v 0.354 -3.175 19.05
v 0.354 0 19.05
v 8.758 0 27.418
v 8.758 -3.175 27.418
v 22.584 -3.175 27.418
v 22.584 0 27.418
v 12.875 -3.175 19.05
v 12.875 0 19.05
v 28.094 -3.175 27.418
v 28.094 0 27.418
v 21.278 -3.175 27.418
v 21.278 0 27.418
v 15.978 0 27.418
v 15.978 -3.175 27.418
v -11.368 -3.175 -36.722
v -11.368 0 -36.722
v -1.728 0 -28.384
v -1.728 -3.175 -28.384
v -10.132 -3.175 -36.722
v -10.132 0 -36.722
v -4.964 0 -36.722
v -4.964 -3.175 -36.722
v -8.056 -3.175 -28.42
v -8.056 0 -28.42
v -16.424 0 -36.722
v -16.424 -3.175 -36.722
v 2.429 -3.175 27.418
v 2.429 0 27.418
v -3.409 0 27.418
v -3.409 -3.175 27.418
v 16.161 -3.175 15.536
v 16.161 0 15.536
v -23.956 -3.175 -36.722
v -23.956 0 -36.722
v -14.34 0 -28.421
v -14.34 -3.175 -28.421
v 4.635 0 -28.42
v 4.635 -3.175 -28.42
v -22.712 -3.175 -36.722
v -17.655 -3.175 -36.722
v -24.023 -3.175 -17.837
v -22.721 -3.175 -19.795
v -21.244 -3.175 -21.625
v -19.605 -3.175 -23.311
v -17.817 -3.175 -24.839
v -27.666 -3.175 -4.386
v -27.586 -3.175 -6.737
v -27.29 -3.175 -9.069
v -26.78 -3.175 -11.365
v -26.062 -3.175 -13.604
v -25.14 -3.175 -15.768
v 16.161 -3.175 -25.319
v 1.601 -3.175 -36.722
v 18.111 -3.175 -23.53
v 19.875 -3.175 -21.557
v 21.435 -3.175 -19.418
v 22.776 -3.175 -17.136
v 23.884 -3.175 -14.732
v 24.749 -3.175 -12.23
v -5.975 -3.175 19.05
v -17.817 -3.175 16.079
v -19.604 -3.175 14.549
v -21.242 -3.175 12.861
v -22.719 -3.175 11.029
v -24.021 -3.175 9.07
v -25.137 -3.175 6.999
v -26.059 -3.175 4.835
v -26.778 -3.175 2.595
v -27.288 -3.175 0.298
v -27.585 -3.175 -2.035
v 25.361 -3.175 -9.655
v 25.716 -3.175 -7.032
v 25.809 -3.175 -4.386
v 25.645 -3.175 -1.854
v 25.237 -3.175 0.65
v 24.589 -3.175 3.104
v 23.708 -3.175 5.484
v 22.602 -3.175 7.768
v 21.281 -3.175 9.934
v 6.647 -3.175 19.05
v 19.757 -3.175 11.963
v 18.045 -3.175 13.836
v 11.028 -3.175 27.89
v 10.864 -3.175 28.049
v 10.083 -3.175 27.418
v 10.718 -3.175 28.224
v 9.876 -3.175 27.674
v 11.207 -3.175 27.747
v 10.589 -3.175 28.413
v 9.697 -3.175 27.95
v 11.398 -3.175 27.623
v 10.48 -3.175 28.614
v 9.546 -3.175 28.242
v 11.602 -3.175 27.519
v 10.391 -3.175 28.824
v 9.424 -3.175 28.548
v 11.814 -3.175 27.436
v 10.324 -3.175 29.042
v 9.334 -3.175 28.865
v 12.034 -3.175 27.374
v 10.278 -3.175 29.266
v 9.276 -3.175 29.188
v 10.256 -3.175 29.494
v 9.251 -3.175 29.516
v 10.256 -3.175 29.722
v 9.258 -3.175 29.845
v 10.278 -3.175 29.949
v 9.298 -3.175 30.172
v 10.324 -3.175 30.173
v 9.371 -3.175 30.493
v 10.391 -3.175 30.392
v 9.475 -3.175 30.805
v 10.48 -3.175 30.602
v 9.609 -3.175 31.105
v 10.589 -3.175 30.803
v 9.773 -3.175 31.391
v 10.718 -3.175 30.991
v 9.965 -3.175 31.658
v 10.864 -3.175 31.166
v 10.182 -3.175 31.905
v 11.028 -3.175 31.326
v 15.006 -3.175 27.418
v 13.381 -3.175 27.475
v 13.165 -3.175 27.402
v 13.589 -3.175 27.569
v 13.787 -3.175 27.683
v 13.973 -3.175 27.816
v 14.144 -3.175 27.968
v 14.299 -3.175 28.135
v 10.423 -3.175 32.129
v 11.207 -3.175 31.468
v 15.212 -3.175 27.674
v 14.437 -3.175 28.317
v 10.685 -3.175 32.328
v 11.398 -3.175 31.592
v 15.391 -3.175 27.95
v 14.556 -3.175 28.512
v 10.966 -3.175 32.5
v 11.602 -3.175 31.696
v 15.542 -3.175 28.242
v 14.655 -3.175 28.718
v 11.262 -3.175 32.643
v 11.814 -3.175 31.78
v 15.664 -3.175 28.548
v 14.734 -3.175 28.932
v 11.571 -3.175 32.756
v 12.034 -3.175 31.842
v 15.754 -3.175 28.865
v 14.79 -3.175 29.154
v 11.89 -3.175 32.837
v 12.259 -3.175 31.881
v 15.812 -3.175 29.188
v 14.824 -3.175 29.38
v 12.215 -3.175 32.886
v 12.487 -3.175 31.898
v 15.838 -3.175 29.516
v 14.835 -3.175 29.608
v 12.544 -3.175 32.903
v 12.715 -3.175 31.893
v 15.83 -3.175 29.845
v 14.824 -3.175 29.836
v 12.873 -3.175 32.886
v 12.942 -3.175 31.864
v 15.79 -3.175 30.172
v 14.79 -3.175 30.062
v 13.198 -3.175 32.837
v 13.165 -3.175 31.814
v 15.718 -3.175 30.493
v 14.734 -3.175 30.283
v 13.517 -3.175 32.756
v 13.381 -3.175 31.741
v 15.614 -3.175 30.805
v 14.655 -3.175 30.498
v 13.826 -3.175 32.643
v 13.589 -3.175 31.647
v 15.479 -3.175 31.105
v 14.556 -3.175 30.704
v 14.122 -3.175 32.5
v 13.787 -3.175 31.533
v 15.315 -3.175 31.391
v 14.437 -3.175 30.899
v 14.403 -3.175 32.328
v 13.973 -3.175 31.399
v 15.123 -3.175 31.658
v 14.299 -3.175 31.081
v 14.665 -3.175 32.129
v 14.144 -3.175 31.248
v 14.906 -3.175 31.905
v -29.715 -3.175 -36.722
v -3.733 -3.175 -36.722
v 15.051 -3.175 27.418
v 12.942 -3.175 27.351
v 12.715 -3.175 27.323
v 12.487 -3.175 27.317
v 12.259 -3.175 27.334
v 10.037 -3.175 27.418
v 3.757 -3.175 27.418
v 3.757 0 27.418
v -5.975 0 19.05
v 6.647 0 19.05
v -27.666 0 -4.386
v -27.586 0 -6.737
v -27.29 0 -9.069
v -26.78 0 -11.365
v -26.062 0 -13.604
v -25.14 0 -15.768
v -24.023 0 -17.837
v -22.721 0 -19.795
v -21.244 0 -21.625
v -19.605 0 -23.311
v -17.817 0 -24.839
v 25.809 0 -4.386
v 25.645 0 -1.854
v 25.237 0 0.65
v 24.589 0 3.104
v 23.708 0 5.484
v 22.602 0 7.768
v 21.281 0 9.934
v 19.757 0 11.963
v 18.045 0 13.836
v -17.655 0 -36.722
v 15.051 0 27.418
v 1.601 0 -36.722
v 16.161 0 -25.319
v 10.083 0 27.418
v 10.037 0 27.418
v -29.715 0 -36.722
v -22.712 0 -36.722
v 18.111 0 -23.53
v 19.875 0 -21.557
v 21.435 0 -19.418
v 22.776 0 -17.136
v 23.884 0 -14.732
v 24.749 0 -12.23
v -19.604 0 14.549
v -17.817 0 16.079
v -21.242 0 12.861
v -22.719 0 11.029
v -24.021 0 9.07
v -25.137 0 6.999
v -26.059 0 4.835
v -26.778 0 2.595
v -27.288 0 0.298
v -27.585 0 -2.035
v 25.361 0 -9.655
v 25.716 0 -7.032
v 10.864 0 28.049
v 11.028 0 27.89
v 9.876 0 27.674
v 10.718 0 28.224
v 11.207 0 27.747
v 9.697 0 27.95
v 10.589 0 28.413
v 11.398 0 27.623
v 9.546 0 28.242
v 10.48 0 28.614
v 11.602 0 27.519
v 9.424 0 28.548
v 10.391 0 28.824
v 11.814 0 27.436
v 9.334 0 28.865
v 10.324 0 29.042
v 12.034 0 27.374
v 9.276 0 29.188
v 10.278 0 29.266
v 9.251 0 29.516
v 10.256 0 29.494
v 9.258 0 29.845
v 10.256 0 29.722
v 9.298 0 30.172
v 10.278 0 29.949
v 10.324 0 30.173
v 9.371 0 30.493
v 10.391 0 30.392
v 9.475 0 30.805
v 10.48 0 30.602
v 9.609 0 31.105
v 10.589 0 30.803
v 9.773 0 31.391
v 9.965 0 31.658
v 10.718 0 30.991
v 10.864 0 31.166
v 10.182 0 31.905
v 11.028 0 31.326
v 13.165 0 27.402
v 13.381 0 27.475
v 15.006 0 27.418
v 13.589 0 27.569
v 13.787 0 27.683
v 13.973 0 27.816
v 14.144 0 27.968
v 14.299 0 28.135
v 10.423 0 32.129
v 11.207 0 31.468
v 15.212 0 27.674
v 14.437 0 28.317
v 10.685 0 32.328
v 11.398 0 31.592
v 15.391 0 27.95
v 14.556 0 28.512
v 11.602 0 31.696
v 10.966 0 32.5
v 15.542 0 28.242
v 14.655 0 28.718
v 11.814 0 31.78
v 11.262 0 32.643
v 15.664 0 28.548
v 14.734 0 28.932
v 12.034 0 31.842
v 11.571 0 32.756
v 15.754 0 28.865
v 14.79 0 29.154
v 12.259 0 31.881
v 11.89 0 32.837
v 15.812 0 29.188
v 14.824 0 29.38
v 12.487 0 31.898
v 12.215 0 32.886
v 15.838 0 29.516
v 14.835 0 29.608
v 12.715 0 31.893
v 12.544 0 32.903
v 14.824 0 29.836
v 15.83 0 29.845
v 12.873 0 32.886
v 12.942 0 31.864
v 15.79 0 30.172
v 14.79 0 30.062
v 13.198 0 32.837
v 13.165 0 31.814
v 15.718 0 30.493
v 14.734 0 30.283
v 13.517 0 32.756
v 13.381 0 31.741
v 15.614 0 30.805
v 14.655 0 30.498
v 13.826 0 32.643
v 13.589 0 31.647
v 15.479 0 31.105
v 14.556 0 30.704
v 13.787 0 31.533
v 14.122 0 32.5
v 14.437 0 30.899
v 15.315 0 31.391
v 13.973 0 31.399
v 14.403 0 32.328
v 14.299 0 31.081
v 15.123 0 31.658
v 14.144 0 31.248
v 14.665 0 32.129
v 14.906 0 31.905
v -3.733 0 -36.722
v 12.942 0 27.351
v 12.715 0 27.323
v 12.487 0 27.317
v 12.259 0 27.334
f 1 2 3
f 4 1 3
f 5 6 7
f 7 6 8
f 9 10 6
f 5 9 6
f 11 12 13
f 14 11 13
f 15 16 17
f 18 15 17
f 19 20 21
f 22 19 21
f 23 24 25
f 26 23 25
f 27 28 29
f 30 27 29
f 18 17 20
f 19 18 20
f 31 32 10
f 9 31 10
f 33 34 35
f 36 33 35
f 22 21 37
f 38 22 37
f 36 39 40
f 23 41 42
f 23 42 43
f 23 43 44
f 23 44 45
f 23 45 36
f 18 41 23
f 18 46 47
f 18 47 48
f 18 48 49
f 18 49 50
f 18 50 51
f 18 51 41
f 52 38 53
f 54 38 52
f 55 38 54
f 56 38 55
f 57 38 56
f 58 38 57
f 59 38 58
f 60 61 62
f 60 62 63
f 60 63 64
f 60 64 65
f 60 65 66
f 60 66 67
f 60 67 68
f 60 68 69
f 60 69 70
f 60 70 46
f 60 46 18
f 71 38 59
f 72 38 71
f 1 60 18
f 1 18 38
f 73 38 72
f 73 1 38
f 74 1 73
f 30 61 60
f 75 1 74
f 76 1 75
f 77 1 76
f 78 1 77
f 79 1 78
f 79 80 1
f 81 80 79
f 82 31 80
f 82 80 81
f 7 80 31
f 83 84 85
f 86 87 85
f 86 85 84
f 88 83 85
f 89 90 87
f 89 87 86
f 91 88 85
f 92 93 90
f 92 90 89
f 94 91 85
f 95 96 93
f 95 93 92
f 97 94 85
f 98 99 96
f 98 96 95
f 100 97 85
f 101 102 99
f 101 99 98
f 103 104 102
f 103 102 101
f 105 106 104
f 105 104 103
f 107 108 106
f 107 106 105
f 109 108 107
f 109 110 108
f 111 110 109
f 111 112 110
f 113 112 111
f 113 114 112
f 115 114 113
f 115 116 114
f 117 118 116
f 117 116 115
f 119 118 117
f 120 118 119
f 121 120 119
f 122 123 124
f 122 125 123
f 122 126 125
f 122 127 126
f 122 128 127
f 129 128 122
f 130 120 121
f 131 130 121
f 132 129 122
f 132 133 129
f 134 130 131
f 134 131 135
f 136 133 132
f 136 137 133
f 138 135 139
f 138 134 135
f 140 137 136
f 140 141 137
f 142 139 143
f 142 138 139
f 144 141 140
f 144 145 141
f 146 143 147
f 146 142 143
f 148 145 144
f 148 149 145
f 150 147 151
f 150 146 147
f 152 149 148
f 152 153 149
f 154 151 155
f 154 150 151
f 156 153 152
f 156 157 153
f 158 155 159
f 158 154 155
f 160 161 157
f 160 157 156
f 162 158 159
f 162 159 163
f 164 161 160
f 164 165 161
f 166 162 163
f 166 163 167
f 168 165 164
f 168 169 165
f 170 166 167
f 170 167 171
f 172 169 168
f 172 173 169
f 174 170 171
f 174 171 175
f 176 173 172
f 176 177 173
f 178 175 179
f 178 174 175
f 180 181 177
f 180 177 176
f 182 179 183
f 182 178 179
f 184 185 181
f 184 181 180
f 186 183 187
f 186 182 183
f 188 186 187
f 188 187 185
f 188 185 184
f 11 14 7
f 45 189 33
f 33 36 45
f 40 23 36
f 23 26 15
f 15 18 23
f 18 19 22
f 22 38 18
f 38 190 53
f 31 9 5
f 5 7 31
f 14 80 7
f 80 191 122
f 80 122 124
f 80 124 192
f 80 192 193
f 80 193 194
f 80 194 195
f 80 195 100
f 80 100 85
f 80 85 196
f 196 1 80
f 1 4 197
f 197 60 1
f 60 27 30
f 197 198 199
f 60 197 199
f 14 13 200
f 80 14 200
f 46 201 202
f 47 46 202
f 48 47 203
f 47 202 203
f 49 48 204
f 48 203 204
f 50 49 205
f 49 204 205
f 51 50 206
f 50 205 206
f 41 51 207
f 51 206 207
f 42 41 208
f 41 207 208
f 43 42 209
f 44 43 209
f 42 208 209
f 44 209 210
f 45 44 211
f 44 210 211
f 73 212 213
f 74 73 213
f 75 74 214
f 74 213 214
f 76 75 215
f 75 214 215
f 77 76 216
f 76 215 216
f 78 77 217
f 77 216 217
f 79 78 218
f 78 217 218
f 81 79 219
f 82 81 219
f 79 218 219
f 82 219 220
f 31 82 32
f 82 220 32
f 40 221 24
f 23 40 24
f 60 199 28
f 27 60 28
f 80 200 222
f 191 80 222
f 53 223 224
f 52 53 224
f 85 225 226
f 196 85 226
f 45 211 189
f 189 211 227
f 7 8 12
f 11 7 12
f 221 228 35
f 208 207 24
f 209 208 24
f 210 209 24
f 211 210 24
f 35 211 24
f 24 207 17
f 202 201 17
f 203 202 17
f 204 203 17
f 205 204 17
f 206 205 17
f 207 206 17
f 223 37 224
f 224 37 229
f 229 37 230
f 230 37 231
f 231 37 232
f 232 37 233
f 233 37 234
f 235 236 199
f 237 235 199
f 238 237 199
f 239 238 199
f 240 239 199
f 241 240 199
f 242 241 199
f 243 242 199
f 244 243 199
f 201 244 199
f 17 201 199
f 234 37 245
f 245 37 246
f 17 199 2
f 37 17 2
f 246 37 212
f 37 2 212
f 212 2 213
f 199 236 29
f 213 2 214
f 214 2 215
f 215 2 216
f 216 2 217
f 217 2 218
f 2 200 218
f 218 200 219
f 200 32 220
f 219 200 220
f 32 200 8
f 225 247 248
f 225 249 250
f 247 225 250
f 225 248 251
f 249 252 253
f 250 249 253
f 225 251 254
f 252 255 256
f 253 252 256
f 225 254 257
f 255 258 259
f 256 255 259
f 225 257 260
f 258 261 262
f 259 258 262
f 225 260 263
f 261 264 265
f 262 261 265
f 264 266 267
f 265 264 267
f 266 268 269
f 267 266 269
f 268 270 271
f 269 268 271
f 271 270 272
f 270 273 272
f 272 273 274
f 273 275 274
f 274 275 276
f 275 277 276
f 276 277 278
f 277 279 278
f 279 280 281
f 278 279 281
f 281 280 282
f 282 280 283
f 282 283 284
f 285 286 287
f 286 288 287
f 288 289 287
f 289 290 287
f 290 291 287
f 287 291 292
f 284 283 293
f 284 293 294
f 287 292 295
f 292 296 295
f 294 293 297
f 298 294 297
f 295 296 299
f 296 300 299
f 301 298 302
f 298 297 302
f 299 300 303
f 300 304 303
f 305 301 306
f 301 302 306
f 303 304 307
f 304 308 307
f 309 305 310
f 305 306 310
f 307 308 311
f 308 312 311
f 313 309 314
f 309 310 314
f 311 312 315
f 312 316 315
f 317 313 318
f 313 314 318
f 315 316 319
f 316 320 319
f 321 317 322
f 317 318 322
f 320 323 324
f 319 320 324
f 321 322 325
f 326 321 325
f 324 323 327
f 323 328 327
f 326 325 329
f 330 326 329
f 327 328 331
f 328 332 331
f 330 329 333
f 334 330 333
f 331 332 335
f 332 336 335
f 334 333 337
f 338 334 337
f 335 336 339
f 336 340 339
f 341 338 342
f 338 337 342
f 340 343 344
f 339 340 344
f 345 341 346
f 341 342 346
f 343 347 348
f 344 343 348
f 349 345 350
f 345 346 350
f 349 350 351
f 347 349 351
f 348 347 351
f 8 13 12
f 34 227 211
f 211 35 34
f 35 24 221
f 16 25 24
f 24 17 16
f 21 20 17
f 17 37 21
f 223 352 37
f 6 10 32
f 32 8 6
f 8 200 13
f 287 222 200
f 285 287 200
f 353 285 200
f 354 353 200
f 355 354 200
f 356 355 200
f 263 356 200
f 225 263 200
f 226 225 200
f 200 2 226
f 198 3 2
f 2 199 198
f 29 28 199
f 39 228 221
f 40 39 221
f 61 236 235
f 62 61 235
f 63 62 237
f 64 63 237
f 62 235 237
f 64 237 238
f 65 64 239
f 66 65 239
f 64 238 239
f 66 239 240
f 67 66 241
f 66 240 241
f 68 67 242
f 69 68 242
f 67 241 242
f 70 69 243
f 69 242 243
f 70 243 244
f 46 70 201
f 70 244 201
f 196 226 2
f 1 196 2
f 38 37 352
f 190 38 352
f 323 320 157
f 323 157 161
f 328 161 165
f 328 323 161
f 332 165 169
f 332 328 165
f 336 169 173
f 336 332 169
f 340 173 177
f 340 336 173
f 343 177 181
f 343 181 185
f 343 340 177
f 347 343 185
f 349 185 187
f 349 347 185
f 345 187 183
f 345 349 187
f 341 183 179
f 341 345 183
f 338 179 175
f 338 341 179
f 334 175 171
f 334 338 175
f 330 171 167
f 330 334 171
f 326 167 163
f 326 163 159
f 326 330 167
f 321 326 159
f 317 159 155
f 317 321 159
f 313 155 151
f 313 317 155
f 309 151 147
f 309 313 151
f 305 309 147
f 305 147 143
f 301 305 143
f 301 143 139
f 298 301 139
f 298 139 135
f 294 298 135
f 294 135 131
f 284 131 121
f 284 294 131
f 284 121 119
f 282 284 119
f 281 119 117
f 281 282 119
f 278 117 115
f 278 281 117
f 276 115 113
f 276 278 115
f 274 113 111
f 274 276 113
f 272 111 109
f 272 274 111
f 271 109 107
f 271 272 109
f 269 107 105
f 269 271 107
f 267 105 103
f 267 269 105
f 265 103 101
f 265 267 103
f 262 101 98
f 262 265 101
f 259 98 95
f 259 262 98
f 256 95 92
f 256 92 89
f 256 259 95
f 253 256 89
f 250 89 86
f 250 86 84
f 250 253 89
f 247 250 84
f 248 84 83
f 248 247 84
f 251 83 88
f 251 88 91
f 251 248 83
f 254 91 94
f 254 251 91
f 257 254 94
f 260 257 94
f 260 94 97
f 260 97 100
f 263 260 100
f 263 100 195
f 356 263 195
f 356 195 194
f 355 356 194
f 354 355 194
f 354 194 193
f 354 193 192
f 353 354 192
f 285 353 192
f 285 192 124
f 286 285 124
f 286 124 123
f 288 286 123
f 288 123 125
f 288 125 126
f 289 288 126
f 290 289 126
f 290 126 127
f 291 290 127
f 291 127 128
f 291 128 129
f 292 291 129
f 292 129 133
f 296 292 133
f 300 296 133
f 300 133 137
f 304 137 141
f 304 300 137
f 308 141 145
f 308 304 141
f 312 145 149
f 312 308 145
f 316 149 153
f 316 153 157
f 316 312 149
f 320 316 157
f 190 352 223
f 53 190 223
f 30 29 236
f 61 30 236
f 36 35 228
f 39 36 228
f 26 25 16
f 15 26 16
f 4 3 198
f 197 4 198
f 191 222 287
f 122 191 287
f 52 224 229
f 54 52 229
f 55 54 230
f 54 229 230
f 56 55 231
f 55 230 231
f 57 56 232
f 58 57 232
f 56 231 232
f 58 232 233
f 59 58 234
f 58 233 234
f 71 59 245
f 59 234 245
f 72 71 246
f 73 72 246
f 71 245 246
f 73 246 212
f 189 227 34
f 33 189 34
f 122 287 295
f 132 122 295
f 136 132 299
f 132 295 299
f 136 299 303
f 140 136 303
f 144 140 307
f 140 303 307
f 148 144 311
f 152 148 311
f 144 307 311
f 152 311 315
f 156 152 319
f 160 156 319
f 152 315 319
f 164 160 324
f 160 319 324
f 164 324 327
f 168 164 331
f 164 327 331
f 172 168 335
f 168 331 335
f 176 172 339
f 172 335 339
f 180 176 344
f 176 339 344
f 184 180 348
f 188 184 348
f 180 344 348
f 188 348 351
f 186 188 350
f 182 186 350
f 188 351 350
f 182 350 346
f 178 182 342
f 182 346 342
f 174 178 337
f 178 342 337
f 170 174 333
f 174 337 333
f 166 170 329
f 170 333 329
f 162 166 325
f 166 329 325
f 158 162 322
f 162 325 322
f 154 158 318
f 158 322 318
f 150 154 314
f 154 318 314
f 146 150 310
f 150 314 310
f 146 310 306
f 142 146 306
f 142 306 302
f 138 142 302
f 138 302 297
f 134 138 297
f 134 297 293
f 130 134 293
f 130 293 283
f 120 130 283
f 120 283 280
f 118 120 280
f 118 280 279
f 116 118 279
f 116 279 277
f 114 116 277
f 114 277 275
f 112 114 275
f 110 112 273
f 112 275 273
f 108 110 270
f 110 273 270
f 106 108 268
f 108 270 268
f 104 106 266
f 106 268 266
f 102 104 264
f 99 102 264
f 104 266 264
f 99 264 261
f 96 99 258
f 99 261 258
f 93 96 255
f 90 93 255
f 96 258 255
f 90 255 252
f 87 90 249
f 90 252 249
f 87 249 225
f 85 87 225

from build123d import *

# Parameters (mm, degrees)
F0_R     = 2.291319
F1_DEPTH = 3.175


with BuildPart() as f1:
    # F0 (on Front) → F1 (new body)
    with BuildSketch(Plane.XZ):
        with BuildLine():
            Line((2.42887, 27.417888), (-3.408971, 27.417888))
            Line((-3.408971, 27.417888), (-17.817384, 16.07928))
            ThreePointArc((-17.817384, 16.07928), (-25.137158, 6.999169), (-27.666417, -4.386364))
            ThreePointArc((-27.666417, -4.386364), (-25.140054, -15.767724), (-17.817384, -24.839458))
            Line((-17.817384, -24.839458), (-29.714837, -36.722033))
            Line((-29.714837, -36.722033), (-23.95565, -36.722033))
            Line((-23.95565, -36.722033), (-14.339792, -28.421288))
            Line((-14.339792, -28.421288), (-22.712222, -36.722033))
            Line((-22.712222, -36.722033), (-17.655194, -36.722033))
            Line((-17.655194, -36.722033), (-8.056328, -28.420344))
            Line((-8.056328, -28.420344), (-16.424194, -36.722033))
            Line((-16.424194, -36.722033), (-11.368304, -36.722033))
            Line((-11.368304, -36.722033), (-1.727521, -28.384091))
            Line((-1.727521, -28.384091), (-10.131928, -36.722033))
            Line((-10.131928, -36.722033), (-4.964177, -36.722033))
            Line((-4.964177, -36.722033), (4.634687, -28.420345))
            Line((4.634687, -28.420345), (-3.733177, -36.722033))
            Line((-3.733177, -36.722033), (1.601154, -36.722033))
            Line((1.601154, -36.722033), (16.160648, -25.319263))
            ThreePointArc((16.160648, -25.319263), (23.359739, -15.947422), (25.809285, -4.386364))
            ThreePointArc((25.809285, -4.386364), (23.18269, 6.63908), (16.160648, 15.535728))
            Line((16.160648, 15.535728), (28.093671, 27.417888))
            Line((28.093671, 27.417888), (22.58408, 27.417888))
            Line((22.58408, 27.417888), (12.874909, 19.050129))
            Line((12.874909, 19.050129), (21.278487, 27.417888))
            Line((21.278487, 27.417888), (15.97779, 27.417888))
            Line((15.97779, 27.417888), (6.647244, 19.050129))
            Line((6.647244, 19.050129), (15.050822, 27.417888))
            Line((15.050822, 27.417888), (15.005607, 27.417888))
            ThreePointArc((15.005607, 27.417888), (12.544089, 32.902522), (10.082572, 27.417888))
            Line((10.082572, 27.417888), (10.037356, 27.417888))
            Line((10.037356, 27.417888), (0.354299, 19.050129))
            Line((0.354299, 19.050129), (8.757877, 27.417888))
            Line((8.757877, 27.417888), (3.757466, 27.417888))
            Line((3.757466, 27.417888), (-5.974708, 19.050129))
            Line((-5.974708, 19.050129), (2.42887, 27.417888))
        make_face()
        with Locations((12.544089, 29.607837)):
            Circle(F0_R, mode=Mode.SUBTRACT)
    extrude(amount=F1_DEPTH)


solid = f1.part
